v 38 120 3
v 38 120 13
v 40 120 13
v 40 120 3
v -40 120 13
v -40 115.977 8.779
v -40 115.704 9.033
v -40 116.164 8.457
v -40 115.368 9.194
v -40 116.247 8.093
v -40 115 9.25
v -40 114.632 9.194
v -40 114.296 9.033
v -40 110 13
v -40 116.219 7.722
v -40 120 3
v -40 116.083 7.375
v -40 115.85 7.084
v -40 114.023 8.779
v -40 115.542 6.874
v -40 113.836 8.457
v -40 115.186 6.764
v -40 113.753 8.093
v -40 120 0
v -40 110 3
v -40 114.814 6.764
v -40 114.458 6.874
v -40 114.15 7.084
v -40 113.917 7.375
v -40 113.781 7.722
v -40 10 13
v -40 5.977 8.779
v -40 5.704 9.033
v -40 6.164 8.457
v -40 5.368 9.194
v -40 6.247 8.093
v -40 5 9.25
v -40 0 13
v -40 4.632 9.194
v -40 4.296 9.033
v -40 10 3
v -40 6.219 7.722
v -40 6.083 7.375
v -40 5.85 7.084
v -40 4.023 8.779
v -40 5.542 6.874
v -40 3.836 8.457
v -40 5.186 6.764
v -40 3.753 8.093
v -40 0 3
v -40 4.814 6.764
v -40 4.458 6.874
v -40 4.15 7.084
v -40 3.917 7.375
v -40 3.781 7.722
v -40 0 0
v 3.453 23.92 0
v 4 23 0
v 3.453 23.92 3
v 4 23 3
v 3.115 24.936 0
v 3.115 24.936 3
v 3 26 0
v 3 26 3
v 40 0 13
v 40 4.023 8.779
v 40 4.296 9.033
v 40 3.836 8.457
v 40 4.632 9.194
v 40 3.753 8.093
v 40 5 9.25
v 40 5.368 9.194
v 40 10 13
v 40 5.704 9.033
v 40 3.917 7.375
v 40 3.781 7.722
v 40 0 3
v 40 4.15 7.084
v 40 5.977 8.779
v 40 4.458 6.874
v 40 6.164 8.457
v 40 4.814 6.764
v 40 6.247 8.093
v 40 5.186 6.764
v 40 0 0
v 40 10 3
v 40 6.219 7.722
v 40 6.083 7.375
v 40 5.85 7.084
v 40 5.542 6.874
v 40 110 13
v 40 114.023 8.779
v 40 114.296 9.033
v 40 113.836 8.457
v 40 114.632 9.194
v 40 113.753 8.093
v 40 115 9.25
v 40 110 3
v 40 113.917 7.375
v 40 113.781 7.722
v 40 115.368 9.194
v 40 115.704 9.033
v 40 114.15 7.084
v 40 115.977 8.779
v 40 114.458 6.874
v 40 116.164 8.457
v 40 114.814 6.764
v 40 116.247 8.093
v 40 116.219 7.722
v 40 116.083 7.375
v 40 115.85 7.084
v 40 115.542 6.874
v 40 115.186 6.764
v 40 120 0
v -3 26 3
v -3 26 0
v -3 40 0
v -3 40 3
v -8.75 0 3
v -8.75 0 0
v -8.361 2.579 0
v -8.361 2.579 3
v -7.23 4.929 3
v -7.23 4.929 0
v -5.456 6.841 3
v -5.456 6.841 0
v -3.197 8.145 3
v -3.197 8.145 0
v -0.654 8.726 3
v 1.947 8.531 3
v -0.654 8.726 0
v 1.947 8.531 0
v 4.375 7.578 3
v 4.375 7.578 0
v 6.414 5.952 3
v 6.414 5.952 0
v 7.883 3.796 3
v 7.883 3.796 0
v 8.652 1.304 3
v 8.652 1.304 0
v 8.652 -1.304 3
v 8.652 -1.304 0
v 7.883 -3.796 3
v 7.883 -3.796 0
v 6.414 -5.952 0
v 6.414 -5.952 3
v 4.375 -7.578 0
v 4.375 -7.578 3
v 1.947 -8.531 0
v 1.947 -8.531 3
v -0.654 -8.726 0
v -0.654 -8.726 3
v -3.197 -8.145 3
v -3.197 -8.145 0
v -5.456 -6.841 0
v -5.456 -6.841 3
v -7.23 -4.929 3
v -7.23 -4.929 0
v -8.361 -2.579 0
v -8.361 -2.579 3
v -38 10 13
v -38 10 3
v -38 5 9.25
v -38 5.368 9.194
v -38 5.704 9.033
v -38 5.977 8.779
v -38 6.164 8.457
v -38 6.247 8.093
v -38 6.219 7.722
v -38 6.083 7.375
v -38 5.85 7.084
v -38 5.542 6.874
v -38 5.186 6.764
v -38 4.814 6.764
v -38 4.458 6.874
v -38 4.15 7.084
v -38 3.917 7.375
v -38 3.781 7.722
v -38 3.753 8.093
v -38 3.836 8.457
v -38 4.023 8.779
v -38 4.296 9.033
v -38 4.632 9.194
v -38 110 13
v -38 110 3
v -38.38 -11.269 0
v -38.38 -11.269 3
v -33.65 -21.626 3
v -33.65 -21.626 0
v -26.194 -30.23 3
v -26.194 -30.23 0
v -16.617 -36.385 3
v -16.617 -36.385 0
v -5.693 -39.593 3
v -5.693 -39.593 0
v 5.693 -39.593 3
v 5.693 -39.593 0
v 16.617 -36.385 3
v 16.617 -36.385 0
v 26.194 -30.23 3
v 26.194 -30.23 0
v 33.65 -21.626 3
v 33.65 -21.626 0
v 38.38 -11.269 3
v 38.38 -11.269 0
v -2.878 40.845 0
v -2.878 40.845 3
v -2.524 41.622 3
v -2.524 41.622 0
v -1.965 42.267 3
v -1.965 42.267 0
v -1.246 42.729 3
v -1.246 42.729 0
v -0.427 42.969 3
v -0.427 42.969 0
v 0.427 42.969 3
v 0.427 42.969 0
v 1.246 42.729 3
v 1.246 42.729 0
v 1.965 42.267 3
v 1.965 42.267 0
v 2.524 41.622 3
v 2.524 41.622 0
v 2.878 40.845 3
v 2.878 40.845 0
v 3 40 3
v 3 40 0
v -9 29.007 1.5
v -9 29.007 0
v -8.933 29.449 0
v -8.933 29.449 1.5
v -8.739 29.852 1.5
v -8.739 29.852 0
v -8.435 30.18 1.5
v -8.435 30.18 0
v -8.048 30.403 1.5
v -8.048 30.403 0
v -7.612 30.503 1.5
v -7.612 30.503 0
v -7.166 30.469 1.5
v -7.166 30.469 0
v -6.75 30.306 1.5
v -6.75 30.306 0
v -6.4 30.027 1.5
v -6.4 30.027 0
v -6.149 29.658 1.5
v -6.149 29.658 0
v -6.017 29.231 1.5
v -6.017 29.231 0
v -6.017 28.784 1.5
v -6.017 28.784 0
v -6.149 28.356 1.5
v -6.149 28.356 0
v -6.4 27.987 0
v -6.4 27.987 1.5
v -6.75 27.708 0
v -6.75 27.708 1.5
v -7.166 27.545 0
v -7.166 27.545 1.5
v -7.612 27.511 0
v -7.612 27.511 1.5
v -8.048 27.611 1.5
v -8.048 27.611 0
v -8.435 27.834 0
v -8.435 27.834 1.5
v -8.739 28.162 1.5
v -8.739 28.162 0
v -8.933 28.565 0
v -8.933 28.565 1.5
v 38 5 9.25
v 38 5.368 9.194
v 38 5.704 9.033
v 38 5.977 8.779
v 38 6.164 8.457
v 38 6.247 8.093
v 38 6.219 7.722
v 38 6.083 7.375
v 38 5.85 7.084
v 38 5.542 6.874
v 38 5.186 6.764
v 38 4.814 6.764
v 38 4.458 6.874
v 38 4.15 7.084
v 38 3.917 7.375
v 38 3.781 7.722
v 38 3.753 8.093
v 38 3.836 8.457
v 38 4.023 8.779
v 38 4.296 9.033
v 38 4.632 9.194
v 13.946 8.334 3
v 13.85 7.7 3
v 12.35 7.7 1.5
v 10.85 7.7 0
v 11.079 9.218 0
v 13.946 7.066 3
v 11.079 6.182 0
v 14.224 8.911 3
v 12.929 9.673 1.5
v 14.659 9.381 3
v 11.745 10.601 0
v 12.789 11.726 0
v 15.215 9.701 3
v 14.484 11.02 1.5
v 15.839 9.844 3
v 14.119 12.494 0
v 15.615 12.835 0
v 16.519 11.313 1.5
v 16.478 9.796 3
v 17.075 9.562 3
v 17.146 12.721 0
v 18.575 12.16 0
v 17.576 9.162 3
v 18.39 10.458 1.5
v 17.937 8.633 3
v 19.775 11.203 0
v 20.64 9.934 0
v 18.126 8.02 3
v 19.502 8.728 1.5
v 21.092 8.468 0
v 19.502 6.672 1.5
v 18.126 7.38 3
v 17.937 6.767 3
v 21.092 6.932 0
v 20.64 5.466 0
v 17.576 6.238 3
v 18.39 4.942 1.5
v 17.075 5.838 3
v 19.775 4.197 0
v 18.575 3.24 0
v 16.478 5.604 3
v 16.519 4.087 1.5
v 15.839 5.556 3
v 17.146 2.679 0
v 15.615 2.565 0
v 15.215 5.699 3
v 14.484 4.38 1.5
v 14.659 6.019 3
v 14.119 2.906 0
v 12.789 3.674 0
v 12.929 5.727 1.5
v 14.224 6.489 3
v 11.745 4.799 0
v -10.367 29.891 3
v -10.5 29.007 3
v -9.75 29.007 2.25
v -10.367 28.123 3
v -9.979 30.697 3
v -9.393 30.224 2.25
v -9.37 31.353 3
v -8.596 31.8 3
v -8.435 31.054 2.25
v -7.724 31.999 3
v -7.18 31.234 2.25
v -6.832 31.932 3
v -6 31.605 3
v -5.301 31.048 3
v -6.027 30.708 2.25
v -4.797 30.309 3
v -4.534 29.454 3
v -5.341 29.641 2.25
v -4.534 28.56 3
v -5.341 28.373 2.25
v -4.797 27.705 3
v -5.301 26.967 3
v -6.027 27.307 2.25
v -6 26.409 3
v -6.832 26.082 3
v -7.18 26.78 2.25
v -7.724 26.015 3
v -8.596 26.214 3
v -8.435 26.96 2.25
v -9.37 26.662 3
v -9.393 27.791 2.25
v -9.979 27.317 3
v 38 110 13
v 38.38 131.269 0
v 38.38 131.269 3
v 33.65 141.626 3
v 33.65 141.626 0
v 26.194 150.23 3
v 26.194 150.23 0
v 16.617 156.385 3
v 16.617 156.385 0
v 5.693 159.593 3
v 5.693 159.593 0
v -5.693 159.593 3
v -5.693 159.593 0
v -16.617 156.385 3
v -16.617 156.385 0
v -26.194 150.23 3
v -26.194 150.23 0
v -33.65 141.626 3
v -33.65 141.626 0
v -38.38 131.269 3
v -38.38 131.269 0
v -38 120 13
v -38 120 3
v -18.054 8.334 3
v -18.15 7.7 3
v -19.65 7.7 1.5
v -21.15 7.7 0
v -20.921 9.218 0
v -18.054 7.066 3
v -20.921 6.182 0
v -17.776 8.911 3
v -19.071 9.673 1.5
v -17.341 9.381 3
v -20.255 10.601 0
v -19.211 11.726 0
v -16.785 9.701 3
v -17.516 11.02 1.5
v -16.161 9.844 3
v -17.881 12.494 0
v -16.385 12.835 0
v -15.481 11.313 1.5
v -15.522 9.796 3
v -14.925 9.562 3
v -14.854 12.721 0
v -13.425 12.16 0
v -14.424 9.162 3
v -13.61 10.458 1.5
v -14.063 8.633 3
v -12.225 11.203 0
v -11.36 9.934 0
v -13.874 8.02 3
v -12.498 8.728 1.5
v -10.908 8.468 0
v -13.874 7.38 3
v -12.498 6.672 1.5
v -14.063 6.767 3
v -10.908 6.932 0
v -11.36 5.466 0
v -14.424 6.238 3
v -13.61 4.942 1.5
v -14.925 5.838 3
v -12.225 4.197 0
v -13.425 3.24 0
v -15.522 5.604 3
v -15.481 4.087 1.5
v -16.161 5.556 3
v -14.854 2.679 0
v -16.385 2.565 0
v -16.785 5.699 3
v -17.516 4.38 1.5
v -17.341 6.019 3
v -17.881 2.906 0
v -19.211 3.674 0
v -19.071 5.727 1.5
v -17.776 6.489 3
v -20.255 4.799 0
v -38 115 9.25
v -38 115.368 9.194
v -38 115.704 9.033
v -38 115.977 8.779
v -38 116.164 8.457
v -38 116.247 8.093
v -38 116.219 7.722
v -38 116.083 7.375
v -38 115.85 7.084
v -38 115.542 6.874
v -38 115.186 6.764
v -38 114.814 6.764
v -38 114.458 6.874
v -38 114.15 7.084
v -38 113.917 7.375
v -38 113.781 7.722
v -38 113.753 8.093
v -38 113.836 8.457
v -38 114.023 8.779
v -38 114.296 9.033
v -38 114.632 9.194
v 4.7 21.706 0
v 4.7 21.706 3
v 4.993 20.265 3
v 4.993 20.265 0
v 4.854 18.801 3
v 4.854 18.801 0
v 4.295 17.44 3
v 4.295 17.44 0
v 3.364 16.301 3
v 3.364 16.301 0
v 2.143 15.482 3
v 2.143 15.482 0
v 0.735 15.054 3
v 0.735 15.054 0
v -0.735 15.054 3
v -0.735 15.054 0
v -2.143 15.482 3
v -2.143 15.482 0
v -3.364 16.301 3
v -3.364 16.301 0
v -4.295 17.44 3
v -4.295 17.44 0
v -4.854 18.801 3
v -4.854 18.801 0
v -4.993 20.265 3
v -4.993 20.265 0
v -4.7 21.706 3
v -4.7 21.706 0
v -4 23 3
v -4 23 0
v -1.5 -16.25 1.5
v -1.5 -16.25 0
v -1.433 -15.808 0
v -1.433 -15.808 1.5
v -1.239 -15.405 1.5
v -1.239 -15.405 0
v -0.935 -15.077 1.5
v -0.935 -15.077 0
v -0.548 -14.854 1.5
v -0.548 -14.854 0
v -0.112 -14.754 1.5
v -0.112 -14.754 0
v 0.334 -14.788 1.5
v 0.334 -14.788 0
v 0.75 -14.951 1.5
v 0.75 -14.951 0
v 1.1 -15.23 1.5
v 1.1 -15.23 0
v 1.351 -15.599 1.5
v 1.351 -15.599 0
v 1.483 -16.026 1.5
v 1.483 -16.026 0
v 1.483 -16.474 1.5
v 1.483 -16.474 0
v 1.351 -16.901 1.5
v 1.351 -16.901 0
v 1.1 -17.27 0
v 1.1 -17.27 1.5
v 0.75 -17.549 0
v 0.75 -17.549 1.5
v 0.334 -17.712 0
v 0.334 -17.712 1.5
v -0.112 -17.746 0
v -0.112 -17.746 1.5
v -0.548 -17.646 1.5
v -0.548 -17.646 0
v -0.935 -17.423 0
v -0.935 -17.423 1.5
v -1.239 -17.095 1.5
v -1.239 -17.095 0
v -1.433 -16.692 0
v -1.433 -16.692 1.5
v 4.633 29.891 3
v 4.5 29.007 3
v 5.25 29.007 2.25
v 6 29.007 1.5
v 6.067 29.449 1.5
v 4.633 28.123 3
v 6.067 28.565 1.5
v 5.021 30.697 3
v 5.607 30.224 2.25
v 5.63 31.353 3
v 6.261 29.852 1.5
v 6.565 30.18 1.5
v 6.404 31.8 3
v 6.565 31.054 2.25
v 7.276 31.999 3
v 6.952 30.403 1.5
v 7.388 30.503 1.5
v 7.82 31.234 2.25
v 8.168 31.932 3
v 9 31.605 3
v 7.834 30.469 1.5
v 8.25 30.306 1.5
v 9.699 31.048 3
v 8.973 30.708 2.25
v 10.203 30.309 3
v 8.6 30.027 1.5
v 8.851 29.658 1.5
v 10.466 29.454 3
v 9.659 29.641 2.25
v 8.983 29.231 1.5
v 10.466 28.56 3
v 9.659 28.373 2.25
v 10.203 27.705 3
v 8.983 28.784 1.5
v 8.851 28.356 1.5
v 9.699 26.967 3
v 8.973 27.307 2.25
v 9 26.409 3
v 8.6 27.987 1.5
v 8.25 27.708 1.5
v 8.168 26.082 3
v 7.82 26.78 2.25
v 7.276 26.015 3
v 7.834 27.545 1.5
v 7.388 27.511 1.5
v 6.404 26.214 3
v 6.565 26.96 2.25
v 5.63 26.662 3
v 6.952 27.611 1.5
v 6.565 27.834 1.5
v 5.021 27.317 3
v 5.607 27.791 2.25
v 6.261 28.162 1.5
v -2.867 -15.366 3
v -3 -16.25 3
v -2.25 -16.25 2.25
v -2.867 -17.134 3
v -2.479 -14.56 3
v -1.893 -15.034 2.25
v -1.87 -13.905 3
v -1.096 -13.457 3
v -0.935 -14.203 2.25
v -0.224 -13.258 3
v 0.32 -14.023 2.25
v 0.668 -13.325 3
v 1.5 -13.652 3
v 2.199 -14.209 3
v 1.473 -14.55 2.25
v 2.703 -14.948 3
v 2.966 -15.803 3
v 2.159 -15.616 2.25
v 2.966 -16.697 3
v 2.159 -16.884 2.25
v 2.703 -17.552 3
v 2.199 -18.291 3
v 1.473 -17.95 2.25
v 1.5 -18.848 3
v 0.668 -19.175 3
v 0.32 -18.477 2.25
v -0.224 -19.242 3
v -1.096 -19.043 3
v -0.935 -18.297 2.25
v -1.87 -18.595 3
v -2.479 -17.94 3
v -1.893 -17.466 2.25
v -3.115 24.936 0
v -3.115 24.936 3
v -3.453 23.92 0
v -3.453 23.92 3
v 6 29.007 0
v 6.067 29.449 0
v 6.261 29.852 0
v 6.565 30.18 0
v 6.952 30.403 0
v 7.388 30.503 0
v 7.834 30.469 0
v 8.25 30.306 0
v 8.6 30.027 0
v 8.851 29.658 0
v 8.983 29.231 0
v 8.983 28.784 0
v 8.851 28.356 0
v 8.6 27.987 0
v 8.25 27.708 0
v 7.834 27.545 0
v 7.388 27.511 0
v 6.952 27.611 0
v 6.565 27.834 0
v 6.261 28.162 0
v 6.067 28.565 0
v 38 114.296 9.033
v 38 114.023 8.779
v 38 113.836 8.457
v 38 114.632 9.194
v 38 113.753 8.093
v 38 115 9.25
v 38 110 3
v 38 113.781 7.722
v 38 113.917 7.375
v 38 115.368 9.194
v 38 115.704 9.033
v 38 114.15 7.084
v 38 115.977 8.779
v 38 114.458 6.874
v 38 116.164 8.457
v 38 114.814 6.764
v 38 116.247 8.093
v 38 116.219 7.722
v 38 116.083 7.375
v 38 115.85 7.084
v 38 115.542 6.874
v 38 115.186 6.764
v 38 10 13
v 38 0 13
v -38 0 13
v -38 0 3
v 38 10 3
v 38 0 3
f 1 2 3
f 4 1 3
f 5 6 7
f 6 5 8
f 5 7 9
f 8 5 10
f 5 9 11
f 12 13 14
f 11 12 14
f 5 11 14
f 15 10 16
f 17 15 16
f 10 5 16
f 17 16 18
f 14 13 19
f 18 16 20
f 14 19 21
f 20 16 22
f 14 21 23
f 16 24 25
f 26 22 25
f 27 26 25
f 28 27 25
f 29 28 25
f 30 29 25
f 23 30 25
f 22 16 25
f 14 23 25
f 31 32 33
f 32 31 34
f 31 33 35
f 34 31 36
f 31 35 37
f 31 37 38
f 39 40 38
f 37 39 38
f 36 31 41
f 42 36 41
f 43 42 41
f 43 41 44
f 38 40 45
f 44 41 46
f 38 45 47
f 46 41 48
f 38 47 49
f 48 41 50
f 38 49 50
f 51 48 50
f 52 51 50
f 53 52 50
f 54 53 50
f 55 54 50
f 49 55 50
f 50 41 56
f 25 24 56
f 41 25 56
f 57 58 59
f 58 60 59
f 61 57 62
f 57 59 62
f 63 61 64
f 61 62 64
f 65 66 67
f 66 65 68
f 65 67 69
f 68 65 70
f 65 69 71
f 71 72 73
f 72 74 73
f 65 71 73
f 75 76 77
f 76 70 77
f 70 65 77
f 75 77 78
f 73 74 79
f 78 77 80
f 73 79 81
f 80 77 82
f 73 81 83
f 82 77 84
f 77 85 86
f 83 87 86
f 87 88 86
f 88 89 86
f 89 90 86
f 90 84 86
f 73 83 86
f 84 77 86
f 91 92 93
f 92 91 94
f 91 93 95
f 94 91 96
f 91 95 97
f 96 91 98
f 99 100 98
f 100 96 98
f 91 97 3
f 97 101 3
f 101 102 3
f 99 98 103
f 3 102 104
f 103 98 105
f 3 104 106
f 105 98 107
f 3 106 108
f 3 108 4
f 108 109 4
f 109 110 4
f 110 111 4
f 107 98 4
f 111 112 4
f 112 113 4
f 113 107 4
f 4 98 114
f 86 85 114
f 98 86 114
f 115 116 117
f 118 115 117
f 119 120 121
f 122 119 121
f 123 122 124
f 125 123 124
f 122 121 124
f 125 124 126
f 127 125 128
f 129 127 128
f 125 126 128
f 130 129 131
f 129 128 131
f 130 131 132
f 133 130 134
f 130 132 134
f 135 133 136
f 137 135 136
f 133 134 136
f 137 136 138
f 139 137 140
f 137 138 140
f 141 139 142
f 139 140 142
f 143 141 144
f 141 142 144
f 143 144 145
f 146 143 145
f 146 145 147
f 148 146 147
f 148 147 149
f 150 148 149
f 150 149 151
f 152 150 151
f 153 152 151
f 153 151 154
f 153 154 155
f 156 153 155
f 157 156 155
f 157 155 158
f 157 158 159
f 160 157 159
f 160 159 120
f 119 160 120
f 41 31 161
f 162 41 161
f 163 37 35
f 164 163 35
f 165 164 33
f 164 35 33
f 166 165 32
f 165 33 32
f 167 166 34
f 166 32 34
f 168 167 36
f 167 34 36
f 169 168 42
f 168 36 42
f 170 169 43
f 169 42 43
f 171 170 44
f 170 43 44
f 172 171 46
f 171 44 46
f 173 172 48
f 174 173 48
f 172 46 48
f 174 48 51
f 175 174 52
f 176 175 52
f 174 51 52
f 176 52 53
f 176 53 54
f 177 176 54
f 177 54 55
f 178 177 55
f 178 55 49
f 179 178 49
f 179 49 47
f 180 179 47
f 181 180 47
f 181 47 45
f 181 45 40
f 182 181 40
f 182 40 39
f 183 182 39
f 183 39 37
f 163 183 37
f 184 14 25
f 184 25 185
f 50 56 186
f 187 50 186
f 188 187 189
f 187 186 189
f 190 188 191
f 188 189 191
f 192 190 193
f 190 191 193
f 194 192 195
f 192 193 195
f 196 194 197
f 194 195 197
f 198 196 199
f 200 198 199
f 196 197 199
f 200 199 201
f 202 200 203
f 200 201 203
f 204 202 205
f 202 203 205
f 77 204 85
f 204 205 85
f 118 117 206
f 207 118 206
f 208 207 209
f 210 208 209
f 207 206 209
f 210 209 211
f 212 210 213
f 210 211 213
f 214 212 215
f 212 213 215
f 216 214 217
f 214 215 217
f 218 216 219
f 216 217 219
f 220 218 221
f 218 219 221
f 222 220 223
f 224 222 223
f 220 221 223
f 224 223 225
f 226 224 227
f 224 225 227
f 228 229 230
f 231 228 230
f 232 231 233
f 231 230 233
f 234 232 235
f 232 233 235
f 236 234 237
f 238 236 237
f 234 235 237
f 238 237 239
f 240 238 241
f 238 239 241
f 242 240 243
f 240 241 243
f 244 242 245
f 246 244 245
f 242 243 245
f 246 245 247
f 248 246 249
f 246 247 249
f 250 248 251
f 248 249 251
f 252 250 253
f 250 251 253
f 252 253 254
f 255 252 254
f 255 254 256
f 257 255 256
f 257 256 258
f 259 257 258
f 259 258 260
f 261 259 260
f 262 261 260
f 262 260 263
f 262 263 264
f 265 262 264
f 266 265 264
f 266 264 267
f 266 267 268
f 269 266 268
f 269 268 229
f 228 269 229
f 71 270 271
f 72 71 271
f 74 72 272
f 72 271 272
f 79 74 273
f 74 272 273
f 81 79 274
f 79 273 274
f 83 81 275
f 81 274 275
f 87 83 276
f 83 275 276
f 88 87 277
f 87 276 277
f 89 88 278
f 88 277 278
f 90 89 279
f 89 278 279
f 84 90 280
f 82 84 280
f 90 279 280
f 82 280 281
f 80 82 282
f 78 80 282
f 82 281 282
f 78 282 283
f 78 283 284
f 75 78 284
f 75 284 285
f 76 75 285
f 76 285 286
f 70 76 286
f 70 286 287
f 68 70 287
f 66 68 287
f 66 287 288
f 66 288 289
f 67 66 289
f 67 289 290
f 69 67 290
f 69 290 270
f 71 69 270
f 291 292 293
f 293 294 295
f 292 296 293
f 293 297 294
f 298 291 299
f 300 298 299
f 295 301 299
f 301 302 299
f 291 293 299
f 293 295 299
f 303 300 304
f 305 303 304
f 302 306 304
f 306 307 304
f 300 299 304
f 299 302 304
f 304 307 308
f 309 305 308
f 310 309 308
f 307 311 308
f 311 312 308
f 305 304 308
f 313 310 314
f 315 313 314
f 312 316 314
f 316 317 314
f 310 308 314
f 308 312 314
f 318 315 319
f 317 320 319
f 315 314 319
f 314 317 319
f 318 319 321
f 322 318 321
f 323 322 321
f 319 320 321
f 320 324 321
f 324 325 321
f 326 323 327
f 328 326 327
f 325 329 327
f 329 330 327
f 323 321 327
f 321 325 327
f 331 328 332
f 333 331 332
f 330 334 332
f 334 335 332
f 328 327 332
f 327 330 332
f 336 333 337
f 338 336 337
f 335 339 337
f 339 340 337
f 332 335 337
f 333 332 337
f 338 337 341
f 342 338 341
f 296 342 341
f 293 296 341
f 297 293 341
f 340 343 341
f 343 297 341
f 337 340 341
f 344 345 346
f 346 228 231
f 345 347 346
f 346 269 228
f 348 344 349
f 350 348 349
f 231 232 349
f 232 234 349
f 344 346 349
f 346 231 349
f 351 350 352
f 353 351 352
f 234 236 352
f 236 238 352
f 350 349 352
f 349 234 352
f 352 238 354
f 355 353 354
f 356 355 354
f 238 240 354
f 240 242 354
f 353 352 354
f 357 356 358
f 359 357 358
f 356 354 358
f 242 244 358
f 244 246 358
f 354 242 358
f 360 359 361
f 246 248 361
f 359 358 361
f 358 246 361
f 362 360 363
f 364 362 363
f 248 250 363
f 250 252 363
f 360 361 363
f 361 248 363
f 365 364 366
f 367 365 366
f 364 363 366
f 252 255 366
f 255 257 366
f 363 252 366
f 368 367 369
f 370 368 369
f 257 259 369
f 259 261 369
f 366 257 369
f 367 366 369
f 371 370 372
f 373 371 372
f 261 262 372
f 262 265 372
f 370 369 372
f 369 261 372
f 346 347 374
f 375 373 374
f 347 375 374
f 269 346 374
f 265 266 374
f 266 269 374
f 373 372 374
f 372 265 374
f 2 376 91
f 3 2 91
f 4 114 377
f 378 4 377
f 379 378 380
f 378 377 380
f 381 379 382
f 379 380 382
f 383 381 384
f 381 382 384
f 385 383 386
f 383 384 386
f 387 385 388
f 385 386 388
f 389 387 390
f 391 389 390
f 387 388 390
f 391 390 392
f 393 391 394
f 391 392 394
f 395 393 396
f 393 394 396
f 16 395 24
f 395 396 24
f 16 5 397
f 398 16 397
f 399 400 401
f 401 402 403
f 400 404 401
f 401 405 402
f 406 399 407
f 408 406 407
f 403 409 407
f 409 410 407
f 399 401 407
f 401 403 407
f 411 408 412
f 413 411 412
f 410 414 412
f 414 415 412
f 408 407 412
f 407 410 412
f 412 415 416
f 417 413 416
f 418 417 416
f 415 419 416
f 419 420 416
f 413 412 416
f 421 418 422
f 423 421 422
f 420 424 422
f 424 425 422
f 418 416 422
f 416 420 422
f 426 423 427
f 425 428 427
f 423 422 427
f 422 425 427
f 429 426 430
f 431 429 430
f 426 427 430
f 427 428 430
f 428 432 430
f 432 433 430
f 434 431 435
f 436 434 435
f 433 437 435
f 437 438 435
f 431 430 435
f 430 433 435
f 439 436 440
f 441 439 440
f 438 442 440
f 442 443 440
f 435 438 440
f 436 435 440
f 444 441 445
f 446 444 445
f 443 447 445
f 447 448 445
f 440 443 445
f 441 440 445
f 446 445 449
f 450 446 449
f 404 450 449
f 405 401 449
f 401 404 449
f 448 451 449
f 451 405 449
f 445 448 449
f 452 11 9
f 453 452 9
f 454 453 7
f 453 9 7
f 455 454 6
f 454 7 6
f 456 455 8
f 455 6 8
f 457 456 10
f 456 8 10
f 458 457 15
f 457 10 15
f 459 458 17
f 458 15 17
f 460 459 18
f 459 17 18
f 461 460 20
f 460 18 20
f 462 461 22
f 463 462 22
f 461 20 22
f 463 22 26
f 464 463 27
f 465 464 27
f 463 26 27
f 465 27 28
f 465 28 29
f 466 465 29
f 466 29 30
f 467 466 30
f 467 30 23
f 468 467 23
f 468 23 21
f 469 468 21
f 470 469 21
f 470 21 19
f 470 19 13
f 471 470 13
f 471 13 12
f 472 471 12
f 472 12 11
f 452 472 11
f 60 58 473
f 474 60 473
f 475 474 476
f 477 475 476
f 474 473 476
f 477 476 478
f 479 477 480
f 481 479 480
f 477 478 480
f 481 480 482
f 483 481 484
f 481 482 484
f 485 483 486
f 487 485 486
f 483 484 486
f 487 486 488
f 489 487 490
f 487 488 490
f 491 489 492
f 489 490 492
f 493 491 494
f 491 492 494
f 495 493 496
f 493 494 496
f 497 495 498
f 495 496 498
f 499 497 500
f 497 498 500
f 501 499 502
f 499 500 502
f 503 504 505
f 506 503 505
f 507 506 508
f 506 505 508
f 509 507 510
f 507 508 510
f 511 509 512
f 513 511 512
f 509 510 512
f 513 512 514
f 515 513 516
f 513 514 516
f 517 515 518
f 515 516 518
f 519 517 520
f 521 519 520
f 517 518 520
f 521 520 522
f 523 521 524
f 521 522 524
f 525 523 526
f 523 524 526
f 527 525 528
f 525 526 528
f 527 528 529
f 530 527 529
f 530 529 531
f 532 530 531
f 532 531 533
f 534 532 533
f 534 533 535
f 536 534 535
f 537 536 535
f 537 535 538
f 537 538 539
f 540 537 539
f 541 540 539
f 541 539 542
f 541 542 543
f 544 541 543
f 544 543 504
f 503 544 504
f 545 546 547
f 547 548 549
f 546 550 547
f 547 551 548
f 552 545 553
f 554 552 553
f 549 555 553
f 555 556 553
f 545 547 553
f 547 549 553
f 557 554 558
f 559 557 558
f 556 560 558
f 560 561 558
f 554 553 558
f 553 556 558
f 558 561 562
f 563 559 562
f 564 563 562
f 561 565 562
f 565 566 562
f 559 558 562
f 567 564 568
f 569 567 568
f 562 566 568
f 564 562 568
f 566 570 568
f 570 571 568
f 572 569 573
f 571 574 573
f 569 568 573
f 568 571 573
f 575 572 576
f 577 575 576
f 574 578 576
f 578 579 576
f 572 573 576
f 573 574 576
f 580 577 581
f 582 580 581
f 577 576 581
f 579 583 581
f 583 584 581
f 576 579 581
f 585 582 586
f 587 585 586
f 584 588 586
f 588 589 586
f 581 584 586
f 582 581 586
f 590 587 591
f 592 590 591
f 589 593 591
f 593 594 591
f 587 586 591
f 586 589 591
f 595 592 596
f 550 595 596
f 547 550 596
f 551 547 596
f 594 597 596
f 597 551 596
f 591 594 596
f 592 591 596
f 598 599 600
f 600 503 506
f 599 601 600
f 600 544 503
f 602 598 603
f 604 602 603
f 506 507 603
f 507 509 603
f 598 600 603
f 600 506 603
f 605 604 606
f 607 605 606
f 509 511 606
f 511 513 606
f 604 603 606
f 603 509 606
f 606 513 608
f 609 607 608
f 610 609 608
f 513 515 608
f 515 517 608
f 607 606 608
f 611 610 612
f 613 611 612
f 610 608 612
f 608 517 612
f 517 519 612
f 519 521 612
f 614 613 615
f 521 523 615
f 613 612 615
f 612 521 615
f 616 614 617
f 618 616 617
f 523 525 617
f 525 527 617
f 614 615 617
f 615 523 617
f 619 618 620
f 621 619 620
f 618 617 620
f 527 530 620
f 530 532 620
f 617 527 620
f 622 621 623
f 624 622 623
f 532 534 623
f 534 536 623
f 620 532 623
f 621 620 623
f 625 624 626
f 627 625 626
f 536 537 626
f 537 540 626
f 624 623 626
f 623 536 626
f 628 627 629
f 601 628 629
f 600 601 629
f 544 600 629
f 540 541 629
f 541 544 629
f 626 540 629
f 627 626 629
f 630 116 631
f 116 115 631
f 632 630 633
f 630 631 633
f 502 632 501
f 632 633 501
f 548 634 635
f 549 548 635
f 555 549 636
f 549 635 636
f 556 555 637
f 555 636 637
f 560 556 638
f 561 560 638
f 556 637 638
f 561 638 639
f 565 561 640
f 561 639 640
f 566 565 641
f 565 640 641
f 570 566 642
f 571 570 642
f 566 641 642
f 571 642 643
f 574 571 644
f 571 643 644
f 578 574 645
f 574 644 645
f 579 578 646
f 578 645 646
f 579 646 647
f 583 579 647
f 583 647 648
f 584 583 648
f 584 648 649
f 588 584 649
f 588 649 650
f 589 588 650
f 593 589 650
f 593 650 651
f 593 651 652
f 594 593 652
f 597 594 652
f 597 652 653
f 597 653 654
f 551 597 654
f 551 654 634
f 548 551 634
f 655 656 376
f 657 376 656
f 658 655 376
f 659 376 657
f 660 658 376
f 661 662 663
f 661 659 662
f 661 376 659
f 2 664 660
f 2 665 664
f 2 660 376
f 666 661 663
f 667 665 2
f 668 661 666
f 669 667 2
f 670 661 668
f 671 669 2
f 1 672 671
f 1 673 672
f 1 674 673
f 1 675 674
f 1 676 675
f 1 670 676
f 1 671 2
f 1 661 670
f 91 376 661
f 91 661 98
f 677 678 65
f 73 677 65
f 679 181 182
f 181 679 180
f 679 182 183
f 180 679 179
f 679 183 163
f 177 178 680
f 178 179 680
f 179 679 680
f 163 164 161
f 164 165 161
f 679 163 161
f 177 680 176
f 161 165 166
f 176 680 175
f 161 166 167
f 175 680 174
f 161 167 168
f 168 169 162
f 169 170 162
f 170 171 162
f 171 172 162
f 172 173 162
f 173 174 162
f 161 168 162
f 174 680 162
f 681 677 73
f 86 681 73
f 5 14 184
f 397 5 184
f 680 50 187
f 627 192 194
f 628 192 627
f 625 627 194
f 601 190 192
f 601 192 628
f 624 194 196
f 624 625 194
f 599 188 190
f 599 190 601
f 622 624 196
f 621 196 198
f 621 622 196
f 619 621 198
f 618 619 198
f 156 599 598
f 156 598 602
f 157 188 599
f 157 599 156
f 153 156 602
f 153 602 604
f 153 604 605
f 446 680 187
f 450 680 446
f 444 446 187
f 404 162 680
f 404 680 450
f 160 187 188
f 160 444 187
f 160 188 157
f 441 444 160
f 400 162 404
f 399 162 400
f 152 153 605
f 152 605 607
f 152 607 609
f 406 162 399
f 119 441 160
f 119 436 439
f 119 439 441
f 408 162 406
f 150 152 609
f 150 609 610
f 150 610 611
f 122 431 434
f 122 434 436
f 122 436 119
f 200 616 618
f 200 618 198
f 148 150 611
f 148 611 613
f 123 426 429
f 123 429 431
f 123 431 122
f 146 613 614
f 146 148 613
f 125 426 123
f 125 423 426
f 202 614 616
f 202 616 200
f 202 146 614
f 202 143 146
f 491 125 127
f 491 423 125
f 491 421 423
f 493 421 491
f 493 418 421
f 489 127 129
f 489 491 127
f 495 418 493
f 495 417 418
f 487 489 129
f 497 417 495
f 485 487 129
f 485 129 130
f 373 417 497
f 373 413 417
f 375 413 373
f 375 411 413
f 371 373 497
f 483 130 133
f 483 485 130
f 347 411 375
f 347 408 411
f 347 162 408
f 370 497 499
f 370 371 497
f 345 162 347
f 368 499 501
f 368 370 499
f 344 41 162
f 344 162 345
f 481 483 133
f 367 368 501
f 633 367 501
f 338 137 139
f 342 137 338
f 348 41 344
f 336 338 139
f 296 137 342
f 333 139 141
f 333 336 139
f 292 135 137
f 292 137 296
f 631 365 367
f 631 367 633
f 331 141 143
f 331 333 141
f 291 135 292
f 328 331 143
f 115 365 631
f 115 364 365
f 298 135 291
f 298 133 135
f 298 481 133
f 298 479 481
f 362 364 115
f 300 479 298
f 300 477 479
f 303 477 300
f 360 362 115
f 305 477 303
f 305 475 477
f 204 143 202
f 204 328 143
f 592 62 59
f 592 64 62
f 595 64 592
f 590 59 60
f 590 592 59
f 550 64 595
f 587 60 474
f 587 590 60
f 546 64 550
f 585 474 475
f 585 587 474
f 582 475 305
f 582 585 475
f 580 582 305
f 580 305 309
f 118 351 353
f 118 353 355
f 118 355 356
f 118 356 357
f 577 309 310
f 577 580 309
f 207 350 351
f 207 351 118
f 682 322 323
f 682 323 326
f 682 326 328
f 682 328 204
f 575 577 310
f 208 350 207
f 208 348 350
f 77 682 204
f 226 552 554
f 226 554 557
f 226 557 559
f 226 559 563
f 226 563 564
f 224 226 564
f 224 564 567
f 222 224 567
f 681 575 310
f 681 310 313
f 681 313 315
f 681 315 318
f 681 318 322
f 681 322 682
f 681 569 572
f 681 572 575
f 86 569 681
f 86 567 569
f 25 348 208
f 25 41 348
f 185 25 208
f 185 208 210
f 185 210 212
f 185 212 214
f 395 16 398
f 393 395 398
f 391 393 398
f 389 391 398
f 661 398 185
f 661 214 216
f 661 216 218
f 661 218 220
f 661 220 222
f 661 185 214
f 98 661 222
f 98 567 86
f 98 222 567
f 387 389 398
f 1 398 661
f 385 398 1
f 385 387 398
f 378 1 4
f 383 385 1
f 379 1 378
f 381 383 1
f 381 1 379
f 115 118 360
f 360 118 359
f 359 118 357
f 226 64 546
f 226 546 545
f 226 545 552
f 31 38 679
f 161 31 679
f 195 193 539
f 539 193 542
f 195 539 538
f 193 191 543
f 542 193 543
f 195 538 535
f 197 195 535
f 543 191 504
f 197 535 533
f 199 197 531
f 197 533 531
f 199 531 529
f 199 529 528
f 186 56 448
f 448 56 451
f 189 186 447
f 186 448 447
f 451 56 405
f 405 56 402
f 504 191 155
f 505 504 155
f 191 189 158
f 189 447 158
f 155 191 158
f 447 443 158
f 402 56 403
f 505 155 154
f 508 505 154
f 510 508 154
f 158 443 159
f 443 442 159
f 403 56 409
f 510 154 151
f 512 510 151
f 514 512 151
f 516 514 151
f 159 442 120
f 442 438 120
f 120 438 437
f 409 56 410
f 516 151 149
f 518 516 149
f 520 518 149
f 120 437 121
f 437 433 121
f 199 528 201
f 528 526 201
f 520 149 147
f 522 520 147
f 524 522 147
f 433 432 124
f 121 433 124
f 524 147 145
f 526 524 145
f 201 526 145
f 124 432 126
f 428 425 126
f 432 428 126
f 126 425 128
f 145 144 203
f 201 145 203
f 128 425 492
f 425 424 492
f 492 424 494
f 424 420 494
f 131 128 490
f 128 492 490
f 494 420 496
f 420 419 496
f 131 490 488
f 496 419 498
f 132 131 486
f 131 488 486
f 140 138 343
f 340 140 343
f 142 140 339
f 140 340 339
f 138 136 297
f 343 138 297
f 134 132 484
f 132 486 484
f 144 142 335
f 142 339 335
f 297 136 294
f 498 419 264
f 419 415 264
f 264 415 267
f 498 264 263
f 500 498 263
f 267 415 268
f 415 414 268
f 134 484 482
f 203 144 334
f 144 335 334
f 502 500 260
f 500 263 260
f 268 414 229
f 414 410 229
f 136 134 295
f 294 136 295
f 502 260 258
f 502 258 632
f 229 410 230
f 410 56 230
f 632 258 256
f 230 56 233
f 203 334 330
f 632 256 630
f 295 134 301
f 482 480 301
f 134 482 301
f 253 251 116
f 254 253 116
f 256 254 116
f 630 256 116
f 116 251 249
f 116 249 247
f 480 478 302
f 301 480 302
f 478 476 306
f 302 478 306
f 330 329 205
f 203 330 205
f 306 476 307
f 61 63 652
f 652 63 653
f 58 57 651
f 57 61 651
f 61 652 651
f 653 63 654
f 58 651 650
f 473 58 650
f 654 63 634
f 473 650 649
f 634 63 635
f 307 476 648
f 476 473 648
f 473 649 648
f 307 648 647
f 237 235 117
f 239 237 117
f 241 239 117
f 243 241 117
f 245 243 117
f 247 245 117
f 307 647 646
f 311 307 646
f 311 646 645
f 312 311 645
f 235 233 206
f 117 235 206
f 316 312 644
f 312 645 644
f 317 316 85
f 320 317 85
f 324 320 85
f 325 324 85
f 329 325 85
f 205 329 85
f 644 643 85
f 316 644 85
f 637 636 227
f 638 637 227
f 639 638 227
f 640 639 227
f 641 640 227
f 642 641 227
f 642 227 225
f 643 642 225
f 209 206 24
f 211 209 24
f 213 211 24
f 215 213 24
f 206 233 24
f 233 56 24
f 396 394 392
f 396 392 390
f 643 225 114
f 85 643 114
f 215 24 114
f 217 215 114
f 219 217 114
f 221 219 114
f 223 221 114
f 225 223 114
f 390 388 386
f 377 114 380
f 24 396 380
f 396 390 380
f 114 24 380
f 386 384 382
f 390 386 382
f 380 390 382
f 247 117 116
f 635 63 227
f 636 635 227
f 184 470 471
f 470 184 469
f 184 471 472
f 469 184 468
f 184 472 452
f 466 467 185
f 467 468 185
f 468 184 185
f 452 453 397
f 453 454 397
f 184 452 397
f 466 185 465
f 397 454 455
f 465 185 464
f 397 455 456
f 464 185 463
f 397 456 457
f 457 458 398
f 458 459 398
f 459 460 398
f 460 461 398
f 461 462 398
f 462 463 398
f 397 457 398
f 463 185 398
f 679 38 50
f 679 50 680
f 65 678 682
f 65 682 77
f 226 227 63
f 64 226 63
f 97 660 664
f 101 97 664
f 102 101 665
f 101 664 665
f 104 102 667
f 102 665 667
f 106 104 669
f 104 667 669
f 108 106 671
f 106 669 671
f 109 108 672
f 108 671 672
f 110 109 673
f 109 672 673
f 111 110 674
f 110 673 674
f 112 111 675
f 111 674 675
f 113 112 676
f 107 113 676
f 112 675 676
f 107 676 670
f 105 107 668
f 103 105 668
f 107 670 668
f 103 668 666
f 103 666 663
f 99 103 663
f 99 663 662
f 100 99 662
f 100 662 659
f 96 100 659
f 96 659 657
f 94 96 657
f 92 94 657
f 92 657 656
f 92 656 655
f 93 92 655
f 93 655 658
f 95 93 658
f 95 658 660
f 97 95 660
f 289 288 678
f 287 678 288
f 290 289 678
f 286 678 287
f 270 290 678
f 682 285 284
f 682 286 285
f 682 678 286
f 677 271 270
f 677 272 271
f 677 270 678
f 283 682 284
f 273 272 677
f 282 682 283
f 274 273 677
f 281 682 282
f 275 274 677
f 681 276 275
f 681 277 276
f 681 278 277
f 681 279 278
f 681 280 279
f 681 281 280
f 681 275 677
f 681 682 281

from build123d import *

# Parameters (mm, degrees)
SKETCH3_R           = 40
BOSS_EXTRUDE4_DEPTH = 3
SKETCH6_R           = 1.5
SKETCH6_R_2         = 8.75
CUT_EXTRUDE2_DEPTH  = 165.951508026
CHAMFER1_SIZE       = 1.5
SKETCH12_W          = 2
SKETCH12_H          = 10
BOSS_EXTRUDE7_DEPTH = 10
SKETCH13_R          = 1.25
CUT_EXTRUDE8_DEPTH  = 180.357185527
SKETCH14_R          = 2.15
CUT_EXTRUDE9_DEPTH  = 166.435788148
CHAMFER2_SIZE       = 3
CUT_EXTRUDE10_DEPTH = 166.435788148
FILLET1_R           = 5


with BuildPart() as part:
    # Sketch3 → Boss-Extrude4 (new body)
    with BuildSketch(Plane.XY):
        with BuildLine():
            ThreePointArc((40, 0), (0, 40), (-40, 0))
            Line((-40, 0), (40, 0))
        make_face()
        with BuildLine():
            Line((40, 0), (-40, 0))
            ThreePointArc((-40, 0), (0, -40), (40, 0))
        make_face()
        with BuildLine():
            Line((-40, 120), (-40, 0))
            ThreePointArc((-40, 0), (0, 40), (40, 0))
            Line((40, 0), (40, 120))
            ThreePointArc((40, 120), (0, 80), (-40, 120))
        make_face()
        with Locations((0, 120)):
            Circle(SKETCH3_R)
    extrude(amount=BOSS_EXTRUDE4_DEPTH)

    # Sketch6 → Cut-Extrude2 (cut, through all)
    with BuildSketch(Plane(origin=(0, 0, 0), x_dir=(-1, 0, 0), z_dir=(0, 0, -1))):
        with Locations((-7.5, 29.007101127)):
            Circle(SKETCH6_R)
        with Locations((7.5, 29.007101127)):
            Circle(SKETCH6_R)
        with Locations((0, -16.25)):
            Circle(SKETCH6_R)
        Circle(SKETCH6_R_2)
    extrude(amount=-CUT_EXTRUDE2_DEPTH, mode=Mode.SUBTRACT)

    # Chamfer1
    chamfer1_edges = [part.edges().sort_by_distance(p)[0] for p in [
        (-6, 29.007101127, 3),
        (1.5, -16.25, 3),
        (9, 29.007101127, 3),
    ]]
    chamfer(chamfer1_edges, length=CHAMFER1_SIZE)

    # Sketch12 → Boss-Extrude7 (add)
    with BuildSketch(Plane.XY.offset(3)):
        with Locations((39, 115)):
            Rectangle(SKETCH12_W, SKETCH12_H)
        with Locations((-39, 115)):
            Rectangle(SKETCH12_W, SKETCH12_H)
        with Locations((-39, 5)):
            Rectangle(SKETCH12_W, SKETCH12_H)
        with Locations((39, 5)):
            Rectangle(SKETCH12_W, SKETCH12_H)
    extrude(amount=BOSS_EXTRUDE7_DEPTH)

    # Sketch13 → Cut-Extrude8 (cut, through all)
    with BuildSketch(Plane.ZY.offset(40)):
        with Locations((8, 115)):
            Circle(SKETCH13_R)
        with Locations((8, 5)):
            Circle(SKETCH13_R)
    extrude(amount=-CUT_EXTRUDE8_DEPTH, mode=Mode.SUBTRACT)

    # Sketch14 → Cut-Extrude9 (cut, through all)
    with BuildSketch(Plane(origin=(0, 0, 0), x_dir=(-1, 0, 0), z_dir=(0, 0, -1))):
        with Locations((-16, 7.7)):
            Circle(SKETCH14_R)
        with Locations((16, 7.7)):
            Circle(SKETCH14_R)
    extrude(amount=-CUT_EXTRUDE9_DEPTH, mode=Mode.SUBTRACT)

    # Chamfer2
    chamfer2_edges = [part.edges().sort_by_distance(p)[0] for p in [
        (18.15, 7.7, 0),
        (-13.85, 7.7, 0),
    ]]
    chamfer(chamfer2_edges, length=CHAMFER2_SIZE - 0.0001)  # a hair under: the kernel refuses the full size

    # Sketch9 → Cut-Extrude10 (cut, through all)
    with BuildSketch(Plane(origin=(0, 0, 0), x_dir=(-1, 0, 0), z_dir=(0, 0, -1))):
        with BuildLine():
            ThreePointArc((3, 40), (0, 43), (-3, 40))
            Line((-3, 40), (-3, 24))
            ThreePointArc((-3, 24), (0, 15), (3, 24))
            Line((3, 24), (3, 40))
        make_face()
    extrude(amount=-CUT_EXTRUDE10_DEPTH, mode=Mode.SUBTRACT)

    # Fillet1
    fillet1_edges = [part.edges().sort_by_distance(p)[0] for p in [
        (3, 24, 1.5),
        (-3, 24, 1.5),
    ]]
    fillet(fillet1_edges, radius=FILLET1_R)


solid = part.part
